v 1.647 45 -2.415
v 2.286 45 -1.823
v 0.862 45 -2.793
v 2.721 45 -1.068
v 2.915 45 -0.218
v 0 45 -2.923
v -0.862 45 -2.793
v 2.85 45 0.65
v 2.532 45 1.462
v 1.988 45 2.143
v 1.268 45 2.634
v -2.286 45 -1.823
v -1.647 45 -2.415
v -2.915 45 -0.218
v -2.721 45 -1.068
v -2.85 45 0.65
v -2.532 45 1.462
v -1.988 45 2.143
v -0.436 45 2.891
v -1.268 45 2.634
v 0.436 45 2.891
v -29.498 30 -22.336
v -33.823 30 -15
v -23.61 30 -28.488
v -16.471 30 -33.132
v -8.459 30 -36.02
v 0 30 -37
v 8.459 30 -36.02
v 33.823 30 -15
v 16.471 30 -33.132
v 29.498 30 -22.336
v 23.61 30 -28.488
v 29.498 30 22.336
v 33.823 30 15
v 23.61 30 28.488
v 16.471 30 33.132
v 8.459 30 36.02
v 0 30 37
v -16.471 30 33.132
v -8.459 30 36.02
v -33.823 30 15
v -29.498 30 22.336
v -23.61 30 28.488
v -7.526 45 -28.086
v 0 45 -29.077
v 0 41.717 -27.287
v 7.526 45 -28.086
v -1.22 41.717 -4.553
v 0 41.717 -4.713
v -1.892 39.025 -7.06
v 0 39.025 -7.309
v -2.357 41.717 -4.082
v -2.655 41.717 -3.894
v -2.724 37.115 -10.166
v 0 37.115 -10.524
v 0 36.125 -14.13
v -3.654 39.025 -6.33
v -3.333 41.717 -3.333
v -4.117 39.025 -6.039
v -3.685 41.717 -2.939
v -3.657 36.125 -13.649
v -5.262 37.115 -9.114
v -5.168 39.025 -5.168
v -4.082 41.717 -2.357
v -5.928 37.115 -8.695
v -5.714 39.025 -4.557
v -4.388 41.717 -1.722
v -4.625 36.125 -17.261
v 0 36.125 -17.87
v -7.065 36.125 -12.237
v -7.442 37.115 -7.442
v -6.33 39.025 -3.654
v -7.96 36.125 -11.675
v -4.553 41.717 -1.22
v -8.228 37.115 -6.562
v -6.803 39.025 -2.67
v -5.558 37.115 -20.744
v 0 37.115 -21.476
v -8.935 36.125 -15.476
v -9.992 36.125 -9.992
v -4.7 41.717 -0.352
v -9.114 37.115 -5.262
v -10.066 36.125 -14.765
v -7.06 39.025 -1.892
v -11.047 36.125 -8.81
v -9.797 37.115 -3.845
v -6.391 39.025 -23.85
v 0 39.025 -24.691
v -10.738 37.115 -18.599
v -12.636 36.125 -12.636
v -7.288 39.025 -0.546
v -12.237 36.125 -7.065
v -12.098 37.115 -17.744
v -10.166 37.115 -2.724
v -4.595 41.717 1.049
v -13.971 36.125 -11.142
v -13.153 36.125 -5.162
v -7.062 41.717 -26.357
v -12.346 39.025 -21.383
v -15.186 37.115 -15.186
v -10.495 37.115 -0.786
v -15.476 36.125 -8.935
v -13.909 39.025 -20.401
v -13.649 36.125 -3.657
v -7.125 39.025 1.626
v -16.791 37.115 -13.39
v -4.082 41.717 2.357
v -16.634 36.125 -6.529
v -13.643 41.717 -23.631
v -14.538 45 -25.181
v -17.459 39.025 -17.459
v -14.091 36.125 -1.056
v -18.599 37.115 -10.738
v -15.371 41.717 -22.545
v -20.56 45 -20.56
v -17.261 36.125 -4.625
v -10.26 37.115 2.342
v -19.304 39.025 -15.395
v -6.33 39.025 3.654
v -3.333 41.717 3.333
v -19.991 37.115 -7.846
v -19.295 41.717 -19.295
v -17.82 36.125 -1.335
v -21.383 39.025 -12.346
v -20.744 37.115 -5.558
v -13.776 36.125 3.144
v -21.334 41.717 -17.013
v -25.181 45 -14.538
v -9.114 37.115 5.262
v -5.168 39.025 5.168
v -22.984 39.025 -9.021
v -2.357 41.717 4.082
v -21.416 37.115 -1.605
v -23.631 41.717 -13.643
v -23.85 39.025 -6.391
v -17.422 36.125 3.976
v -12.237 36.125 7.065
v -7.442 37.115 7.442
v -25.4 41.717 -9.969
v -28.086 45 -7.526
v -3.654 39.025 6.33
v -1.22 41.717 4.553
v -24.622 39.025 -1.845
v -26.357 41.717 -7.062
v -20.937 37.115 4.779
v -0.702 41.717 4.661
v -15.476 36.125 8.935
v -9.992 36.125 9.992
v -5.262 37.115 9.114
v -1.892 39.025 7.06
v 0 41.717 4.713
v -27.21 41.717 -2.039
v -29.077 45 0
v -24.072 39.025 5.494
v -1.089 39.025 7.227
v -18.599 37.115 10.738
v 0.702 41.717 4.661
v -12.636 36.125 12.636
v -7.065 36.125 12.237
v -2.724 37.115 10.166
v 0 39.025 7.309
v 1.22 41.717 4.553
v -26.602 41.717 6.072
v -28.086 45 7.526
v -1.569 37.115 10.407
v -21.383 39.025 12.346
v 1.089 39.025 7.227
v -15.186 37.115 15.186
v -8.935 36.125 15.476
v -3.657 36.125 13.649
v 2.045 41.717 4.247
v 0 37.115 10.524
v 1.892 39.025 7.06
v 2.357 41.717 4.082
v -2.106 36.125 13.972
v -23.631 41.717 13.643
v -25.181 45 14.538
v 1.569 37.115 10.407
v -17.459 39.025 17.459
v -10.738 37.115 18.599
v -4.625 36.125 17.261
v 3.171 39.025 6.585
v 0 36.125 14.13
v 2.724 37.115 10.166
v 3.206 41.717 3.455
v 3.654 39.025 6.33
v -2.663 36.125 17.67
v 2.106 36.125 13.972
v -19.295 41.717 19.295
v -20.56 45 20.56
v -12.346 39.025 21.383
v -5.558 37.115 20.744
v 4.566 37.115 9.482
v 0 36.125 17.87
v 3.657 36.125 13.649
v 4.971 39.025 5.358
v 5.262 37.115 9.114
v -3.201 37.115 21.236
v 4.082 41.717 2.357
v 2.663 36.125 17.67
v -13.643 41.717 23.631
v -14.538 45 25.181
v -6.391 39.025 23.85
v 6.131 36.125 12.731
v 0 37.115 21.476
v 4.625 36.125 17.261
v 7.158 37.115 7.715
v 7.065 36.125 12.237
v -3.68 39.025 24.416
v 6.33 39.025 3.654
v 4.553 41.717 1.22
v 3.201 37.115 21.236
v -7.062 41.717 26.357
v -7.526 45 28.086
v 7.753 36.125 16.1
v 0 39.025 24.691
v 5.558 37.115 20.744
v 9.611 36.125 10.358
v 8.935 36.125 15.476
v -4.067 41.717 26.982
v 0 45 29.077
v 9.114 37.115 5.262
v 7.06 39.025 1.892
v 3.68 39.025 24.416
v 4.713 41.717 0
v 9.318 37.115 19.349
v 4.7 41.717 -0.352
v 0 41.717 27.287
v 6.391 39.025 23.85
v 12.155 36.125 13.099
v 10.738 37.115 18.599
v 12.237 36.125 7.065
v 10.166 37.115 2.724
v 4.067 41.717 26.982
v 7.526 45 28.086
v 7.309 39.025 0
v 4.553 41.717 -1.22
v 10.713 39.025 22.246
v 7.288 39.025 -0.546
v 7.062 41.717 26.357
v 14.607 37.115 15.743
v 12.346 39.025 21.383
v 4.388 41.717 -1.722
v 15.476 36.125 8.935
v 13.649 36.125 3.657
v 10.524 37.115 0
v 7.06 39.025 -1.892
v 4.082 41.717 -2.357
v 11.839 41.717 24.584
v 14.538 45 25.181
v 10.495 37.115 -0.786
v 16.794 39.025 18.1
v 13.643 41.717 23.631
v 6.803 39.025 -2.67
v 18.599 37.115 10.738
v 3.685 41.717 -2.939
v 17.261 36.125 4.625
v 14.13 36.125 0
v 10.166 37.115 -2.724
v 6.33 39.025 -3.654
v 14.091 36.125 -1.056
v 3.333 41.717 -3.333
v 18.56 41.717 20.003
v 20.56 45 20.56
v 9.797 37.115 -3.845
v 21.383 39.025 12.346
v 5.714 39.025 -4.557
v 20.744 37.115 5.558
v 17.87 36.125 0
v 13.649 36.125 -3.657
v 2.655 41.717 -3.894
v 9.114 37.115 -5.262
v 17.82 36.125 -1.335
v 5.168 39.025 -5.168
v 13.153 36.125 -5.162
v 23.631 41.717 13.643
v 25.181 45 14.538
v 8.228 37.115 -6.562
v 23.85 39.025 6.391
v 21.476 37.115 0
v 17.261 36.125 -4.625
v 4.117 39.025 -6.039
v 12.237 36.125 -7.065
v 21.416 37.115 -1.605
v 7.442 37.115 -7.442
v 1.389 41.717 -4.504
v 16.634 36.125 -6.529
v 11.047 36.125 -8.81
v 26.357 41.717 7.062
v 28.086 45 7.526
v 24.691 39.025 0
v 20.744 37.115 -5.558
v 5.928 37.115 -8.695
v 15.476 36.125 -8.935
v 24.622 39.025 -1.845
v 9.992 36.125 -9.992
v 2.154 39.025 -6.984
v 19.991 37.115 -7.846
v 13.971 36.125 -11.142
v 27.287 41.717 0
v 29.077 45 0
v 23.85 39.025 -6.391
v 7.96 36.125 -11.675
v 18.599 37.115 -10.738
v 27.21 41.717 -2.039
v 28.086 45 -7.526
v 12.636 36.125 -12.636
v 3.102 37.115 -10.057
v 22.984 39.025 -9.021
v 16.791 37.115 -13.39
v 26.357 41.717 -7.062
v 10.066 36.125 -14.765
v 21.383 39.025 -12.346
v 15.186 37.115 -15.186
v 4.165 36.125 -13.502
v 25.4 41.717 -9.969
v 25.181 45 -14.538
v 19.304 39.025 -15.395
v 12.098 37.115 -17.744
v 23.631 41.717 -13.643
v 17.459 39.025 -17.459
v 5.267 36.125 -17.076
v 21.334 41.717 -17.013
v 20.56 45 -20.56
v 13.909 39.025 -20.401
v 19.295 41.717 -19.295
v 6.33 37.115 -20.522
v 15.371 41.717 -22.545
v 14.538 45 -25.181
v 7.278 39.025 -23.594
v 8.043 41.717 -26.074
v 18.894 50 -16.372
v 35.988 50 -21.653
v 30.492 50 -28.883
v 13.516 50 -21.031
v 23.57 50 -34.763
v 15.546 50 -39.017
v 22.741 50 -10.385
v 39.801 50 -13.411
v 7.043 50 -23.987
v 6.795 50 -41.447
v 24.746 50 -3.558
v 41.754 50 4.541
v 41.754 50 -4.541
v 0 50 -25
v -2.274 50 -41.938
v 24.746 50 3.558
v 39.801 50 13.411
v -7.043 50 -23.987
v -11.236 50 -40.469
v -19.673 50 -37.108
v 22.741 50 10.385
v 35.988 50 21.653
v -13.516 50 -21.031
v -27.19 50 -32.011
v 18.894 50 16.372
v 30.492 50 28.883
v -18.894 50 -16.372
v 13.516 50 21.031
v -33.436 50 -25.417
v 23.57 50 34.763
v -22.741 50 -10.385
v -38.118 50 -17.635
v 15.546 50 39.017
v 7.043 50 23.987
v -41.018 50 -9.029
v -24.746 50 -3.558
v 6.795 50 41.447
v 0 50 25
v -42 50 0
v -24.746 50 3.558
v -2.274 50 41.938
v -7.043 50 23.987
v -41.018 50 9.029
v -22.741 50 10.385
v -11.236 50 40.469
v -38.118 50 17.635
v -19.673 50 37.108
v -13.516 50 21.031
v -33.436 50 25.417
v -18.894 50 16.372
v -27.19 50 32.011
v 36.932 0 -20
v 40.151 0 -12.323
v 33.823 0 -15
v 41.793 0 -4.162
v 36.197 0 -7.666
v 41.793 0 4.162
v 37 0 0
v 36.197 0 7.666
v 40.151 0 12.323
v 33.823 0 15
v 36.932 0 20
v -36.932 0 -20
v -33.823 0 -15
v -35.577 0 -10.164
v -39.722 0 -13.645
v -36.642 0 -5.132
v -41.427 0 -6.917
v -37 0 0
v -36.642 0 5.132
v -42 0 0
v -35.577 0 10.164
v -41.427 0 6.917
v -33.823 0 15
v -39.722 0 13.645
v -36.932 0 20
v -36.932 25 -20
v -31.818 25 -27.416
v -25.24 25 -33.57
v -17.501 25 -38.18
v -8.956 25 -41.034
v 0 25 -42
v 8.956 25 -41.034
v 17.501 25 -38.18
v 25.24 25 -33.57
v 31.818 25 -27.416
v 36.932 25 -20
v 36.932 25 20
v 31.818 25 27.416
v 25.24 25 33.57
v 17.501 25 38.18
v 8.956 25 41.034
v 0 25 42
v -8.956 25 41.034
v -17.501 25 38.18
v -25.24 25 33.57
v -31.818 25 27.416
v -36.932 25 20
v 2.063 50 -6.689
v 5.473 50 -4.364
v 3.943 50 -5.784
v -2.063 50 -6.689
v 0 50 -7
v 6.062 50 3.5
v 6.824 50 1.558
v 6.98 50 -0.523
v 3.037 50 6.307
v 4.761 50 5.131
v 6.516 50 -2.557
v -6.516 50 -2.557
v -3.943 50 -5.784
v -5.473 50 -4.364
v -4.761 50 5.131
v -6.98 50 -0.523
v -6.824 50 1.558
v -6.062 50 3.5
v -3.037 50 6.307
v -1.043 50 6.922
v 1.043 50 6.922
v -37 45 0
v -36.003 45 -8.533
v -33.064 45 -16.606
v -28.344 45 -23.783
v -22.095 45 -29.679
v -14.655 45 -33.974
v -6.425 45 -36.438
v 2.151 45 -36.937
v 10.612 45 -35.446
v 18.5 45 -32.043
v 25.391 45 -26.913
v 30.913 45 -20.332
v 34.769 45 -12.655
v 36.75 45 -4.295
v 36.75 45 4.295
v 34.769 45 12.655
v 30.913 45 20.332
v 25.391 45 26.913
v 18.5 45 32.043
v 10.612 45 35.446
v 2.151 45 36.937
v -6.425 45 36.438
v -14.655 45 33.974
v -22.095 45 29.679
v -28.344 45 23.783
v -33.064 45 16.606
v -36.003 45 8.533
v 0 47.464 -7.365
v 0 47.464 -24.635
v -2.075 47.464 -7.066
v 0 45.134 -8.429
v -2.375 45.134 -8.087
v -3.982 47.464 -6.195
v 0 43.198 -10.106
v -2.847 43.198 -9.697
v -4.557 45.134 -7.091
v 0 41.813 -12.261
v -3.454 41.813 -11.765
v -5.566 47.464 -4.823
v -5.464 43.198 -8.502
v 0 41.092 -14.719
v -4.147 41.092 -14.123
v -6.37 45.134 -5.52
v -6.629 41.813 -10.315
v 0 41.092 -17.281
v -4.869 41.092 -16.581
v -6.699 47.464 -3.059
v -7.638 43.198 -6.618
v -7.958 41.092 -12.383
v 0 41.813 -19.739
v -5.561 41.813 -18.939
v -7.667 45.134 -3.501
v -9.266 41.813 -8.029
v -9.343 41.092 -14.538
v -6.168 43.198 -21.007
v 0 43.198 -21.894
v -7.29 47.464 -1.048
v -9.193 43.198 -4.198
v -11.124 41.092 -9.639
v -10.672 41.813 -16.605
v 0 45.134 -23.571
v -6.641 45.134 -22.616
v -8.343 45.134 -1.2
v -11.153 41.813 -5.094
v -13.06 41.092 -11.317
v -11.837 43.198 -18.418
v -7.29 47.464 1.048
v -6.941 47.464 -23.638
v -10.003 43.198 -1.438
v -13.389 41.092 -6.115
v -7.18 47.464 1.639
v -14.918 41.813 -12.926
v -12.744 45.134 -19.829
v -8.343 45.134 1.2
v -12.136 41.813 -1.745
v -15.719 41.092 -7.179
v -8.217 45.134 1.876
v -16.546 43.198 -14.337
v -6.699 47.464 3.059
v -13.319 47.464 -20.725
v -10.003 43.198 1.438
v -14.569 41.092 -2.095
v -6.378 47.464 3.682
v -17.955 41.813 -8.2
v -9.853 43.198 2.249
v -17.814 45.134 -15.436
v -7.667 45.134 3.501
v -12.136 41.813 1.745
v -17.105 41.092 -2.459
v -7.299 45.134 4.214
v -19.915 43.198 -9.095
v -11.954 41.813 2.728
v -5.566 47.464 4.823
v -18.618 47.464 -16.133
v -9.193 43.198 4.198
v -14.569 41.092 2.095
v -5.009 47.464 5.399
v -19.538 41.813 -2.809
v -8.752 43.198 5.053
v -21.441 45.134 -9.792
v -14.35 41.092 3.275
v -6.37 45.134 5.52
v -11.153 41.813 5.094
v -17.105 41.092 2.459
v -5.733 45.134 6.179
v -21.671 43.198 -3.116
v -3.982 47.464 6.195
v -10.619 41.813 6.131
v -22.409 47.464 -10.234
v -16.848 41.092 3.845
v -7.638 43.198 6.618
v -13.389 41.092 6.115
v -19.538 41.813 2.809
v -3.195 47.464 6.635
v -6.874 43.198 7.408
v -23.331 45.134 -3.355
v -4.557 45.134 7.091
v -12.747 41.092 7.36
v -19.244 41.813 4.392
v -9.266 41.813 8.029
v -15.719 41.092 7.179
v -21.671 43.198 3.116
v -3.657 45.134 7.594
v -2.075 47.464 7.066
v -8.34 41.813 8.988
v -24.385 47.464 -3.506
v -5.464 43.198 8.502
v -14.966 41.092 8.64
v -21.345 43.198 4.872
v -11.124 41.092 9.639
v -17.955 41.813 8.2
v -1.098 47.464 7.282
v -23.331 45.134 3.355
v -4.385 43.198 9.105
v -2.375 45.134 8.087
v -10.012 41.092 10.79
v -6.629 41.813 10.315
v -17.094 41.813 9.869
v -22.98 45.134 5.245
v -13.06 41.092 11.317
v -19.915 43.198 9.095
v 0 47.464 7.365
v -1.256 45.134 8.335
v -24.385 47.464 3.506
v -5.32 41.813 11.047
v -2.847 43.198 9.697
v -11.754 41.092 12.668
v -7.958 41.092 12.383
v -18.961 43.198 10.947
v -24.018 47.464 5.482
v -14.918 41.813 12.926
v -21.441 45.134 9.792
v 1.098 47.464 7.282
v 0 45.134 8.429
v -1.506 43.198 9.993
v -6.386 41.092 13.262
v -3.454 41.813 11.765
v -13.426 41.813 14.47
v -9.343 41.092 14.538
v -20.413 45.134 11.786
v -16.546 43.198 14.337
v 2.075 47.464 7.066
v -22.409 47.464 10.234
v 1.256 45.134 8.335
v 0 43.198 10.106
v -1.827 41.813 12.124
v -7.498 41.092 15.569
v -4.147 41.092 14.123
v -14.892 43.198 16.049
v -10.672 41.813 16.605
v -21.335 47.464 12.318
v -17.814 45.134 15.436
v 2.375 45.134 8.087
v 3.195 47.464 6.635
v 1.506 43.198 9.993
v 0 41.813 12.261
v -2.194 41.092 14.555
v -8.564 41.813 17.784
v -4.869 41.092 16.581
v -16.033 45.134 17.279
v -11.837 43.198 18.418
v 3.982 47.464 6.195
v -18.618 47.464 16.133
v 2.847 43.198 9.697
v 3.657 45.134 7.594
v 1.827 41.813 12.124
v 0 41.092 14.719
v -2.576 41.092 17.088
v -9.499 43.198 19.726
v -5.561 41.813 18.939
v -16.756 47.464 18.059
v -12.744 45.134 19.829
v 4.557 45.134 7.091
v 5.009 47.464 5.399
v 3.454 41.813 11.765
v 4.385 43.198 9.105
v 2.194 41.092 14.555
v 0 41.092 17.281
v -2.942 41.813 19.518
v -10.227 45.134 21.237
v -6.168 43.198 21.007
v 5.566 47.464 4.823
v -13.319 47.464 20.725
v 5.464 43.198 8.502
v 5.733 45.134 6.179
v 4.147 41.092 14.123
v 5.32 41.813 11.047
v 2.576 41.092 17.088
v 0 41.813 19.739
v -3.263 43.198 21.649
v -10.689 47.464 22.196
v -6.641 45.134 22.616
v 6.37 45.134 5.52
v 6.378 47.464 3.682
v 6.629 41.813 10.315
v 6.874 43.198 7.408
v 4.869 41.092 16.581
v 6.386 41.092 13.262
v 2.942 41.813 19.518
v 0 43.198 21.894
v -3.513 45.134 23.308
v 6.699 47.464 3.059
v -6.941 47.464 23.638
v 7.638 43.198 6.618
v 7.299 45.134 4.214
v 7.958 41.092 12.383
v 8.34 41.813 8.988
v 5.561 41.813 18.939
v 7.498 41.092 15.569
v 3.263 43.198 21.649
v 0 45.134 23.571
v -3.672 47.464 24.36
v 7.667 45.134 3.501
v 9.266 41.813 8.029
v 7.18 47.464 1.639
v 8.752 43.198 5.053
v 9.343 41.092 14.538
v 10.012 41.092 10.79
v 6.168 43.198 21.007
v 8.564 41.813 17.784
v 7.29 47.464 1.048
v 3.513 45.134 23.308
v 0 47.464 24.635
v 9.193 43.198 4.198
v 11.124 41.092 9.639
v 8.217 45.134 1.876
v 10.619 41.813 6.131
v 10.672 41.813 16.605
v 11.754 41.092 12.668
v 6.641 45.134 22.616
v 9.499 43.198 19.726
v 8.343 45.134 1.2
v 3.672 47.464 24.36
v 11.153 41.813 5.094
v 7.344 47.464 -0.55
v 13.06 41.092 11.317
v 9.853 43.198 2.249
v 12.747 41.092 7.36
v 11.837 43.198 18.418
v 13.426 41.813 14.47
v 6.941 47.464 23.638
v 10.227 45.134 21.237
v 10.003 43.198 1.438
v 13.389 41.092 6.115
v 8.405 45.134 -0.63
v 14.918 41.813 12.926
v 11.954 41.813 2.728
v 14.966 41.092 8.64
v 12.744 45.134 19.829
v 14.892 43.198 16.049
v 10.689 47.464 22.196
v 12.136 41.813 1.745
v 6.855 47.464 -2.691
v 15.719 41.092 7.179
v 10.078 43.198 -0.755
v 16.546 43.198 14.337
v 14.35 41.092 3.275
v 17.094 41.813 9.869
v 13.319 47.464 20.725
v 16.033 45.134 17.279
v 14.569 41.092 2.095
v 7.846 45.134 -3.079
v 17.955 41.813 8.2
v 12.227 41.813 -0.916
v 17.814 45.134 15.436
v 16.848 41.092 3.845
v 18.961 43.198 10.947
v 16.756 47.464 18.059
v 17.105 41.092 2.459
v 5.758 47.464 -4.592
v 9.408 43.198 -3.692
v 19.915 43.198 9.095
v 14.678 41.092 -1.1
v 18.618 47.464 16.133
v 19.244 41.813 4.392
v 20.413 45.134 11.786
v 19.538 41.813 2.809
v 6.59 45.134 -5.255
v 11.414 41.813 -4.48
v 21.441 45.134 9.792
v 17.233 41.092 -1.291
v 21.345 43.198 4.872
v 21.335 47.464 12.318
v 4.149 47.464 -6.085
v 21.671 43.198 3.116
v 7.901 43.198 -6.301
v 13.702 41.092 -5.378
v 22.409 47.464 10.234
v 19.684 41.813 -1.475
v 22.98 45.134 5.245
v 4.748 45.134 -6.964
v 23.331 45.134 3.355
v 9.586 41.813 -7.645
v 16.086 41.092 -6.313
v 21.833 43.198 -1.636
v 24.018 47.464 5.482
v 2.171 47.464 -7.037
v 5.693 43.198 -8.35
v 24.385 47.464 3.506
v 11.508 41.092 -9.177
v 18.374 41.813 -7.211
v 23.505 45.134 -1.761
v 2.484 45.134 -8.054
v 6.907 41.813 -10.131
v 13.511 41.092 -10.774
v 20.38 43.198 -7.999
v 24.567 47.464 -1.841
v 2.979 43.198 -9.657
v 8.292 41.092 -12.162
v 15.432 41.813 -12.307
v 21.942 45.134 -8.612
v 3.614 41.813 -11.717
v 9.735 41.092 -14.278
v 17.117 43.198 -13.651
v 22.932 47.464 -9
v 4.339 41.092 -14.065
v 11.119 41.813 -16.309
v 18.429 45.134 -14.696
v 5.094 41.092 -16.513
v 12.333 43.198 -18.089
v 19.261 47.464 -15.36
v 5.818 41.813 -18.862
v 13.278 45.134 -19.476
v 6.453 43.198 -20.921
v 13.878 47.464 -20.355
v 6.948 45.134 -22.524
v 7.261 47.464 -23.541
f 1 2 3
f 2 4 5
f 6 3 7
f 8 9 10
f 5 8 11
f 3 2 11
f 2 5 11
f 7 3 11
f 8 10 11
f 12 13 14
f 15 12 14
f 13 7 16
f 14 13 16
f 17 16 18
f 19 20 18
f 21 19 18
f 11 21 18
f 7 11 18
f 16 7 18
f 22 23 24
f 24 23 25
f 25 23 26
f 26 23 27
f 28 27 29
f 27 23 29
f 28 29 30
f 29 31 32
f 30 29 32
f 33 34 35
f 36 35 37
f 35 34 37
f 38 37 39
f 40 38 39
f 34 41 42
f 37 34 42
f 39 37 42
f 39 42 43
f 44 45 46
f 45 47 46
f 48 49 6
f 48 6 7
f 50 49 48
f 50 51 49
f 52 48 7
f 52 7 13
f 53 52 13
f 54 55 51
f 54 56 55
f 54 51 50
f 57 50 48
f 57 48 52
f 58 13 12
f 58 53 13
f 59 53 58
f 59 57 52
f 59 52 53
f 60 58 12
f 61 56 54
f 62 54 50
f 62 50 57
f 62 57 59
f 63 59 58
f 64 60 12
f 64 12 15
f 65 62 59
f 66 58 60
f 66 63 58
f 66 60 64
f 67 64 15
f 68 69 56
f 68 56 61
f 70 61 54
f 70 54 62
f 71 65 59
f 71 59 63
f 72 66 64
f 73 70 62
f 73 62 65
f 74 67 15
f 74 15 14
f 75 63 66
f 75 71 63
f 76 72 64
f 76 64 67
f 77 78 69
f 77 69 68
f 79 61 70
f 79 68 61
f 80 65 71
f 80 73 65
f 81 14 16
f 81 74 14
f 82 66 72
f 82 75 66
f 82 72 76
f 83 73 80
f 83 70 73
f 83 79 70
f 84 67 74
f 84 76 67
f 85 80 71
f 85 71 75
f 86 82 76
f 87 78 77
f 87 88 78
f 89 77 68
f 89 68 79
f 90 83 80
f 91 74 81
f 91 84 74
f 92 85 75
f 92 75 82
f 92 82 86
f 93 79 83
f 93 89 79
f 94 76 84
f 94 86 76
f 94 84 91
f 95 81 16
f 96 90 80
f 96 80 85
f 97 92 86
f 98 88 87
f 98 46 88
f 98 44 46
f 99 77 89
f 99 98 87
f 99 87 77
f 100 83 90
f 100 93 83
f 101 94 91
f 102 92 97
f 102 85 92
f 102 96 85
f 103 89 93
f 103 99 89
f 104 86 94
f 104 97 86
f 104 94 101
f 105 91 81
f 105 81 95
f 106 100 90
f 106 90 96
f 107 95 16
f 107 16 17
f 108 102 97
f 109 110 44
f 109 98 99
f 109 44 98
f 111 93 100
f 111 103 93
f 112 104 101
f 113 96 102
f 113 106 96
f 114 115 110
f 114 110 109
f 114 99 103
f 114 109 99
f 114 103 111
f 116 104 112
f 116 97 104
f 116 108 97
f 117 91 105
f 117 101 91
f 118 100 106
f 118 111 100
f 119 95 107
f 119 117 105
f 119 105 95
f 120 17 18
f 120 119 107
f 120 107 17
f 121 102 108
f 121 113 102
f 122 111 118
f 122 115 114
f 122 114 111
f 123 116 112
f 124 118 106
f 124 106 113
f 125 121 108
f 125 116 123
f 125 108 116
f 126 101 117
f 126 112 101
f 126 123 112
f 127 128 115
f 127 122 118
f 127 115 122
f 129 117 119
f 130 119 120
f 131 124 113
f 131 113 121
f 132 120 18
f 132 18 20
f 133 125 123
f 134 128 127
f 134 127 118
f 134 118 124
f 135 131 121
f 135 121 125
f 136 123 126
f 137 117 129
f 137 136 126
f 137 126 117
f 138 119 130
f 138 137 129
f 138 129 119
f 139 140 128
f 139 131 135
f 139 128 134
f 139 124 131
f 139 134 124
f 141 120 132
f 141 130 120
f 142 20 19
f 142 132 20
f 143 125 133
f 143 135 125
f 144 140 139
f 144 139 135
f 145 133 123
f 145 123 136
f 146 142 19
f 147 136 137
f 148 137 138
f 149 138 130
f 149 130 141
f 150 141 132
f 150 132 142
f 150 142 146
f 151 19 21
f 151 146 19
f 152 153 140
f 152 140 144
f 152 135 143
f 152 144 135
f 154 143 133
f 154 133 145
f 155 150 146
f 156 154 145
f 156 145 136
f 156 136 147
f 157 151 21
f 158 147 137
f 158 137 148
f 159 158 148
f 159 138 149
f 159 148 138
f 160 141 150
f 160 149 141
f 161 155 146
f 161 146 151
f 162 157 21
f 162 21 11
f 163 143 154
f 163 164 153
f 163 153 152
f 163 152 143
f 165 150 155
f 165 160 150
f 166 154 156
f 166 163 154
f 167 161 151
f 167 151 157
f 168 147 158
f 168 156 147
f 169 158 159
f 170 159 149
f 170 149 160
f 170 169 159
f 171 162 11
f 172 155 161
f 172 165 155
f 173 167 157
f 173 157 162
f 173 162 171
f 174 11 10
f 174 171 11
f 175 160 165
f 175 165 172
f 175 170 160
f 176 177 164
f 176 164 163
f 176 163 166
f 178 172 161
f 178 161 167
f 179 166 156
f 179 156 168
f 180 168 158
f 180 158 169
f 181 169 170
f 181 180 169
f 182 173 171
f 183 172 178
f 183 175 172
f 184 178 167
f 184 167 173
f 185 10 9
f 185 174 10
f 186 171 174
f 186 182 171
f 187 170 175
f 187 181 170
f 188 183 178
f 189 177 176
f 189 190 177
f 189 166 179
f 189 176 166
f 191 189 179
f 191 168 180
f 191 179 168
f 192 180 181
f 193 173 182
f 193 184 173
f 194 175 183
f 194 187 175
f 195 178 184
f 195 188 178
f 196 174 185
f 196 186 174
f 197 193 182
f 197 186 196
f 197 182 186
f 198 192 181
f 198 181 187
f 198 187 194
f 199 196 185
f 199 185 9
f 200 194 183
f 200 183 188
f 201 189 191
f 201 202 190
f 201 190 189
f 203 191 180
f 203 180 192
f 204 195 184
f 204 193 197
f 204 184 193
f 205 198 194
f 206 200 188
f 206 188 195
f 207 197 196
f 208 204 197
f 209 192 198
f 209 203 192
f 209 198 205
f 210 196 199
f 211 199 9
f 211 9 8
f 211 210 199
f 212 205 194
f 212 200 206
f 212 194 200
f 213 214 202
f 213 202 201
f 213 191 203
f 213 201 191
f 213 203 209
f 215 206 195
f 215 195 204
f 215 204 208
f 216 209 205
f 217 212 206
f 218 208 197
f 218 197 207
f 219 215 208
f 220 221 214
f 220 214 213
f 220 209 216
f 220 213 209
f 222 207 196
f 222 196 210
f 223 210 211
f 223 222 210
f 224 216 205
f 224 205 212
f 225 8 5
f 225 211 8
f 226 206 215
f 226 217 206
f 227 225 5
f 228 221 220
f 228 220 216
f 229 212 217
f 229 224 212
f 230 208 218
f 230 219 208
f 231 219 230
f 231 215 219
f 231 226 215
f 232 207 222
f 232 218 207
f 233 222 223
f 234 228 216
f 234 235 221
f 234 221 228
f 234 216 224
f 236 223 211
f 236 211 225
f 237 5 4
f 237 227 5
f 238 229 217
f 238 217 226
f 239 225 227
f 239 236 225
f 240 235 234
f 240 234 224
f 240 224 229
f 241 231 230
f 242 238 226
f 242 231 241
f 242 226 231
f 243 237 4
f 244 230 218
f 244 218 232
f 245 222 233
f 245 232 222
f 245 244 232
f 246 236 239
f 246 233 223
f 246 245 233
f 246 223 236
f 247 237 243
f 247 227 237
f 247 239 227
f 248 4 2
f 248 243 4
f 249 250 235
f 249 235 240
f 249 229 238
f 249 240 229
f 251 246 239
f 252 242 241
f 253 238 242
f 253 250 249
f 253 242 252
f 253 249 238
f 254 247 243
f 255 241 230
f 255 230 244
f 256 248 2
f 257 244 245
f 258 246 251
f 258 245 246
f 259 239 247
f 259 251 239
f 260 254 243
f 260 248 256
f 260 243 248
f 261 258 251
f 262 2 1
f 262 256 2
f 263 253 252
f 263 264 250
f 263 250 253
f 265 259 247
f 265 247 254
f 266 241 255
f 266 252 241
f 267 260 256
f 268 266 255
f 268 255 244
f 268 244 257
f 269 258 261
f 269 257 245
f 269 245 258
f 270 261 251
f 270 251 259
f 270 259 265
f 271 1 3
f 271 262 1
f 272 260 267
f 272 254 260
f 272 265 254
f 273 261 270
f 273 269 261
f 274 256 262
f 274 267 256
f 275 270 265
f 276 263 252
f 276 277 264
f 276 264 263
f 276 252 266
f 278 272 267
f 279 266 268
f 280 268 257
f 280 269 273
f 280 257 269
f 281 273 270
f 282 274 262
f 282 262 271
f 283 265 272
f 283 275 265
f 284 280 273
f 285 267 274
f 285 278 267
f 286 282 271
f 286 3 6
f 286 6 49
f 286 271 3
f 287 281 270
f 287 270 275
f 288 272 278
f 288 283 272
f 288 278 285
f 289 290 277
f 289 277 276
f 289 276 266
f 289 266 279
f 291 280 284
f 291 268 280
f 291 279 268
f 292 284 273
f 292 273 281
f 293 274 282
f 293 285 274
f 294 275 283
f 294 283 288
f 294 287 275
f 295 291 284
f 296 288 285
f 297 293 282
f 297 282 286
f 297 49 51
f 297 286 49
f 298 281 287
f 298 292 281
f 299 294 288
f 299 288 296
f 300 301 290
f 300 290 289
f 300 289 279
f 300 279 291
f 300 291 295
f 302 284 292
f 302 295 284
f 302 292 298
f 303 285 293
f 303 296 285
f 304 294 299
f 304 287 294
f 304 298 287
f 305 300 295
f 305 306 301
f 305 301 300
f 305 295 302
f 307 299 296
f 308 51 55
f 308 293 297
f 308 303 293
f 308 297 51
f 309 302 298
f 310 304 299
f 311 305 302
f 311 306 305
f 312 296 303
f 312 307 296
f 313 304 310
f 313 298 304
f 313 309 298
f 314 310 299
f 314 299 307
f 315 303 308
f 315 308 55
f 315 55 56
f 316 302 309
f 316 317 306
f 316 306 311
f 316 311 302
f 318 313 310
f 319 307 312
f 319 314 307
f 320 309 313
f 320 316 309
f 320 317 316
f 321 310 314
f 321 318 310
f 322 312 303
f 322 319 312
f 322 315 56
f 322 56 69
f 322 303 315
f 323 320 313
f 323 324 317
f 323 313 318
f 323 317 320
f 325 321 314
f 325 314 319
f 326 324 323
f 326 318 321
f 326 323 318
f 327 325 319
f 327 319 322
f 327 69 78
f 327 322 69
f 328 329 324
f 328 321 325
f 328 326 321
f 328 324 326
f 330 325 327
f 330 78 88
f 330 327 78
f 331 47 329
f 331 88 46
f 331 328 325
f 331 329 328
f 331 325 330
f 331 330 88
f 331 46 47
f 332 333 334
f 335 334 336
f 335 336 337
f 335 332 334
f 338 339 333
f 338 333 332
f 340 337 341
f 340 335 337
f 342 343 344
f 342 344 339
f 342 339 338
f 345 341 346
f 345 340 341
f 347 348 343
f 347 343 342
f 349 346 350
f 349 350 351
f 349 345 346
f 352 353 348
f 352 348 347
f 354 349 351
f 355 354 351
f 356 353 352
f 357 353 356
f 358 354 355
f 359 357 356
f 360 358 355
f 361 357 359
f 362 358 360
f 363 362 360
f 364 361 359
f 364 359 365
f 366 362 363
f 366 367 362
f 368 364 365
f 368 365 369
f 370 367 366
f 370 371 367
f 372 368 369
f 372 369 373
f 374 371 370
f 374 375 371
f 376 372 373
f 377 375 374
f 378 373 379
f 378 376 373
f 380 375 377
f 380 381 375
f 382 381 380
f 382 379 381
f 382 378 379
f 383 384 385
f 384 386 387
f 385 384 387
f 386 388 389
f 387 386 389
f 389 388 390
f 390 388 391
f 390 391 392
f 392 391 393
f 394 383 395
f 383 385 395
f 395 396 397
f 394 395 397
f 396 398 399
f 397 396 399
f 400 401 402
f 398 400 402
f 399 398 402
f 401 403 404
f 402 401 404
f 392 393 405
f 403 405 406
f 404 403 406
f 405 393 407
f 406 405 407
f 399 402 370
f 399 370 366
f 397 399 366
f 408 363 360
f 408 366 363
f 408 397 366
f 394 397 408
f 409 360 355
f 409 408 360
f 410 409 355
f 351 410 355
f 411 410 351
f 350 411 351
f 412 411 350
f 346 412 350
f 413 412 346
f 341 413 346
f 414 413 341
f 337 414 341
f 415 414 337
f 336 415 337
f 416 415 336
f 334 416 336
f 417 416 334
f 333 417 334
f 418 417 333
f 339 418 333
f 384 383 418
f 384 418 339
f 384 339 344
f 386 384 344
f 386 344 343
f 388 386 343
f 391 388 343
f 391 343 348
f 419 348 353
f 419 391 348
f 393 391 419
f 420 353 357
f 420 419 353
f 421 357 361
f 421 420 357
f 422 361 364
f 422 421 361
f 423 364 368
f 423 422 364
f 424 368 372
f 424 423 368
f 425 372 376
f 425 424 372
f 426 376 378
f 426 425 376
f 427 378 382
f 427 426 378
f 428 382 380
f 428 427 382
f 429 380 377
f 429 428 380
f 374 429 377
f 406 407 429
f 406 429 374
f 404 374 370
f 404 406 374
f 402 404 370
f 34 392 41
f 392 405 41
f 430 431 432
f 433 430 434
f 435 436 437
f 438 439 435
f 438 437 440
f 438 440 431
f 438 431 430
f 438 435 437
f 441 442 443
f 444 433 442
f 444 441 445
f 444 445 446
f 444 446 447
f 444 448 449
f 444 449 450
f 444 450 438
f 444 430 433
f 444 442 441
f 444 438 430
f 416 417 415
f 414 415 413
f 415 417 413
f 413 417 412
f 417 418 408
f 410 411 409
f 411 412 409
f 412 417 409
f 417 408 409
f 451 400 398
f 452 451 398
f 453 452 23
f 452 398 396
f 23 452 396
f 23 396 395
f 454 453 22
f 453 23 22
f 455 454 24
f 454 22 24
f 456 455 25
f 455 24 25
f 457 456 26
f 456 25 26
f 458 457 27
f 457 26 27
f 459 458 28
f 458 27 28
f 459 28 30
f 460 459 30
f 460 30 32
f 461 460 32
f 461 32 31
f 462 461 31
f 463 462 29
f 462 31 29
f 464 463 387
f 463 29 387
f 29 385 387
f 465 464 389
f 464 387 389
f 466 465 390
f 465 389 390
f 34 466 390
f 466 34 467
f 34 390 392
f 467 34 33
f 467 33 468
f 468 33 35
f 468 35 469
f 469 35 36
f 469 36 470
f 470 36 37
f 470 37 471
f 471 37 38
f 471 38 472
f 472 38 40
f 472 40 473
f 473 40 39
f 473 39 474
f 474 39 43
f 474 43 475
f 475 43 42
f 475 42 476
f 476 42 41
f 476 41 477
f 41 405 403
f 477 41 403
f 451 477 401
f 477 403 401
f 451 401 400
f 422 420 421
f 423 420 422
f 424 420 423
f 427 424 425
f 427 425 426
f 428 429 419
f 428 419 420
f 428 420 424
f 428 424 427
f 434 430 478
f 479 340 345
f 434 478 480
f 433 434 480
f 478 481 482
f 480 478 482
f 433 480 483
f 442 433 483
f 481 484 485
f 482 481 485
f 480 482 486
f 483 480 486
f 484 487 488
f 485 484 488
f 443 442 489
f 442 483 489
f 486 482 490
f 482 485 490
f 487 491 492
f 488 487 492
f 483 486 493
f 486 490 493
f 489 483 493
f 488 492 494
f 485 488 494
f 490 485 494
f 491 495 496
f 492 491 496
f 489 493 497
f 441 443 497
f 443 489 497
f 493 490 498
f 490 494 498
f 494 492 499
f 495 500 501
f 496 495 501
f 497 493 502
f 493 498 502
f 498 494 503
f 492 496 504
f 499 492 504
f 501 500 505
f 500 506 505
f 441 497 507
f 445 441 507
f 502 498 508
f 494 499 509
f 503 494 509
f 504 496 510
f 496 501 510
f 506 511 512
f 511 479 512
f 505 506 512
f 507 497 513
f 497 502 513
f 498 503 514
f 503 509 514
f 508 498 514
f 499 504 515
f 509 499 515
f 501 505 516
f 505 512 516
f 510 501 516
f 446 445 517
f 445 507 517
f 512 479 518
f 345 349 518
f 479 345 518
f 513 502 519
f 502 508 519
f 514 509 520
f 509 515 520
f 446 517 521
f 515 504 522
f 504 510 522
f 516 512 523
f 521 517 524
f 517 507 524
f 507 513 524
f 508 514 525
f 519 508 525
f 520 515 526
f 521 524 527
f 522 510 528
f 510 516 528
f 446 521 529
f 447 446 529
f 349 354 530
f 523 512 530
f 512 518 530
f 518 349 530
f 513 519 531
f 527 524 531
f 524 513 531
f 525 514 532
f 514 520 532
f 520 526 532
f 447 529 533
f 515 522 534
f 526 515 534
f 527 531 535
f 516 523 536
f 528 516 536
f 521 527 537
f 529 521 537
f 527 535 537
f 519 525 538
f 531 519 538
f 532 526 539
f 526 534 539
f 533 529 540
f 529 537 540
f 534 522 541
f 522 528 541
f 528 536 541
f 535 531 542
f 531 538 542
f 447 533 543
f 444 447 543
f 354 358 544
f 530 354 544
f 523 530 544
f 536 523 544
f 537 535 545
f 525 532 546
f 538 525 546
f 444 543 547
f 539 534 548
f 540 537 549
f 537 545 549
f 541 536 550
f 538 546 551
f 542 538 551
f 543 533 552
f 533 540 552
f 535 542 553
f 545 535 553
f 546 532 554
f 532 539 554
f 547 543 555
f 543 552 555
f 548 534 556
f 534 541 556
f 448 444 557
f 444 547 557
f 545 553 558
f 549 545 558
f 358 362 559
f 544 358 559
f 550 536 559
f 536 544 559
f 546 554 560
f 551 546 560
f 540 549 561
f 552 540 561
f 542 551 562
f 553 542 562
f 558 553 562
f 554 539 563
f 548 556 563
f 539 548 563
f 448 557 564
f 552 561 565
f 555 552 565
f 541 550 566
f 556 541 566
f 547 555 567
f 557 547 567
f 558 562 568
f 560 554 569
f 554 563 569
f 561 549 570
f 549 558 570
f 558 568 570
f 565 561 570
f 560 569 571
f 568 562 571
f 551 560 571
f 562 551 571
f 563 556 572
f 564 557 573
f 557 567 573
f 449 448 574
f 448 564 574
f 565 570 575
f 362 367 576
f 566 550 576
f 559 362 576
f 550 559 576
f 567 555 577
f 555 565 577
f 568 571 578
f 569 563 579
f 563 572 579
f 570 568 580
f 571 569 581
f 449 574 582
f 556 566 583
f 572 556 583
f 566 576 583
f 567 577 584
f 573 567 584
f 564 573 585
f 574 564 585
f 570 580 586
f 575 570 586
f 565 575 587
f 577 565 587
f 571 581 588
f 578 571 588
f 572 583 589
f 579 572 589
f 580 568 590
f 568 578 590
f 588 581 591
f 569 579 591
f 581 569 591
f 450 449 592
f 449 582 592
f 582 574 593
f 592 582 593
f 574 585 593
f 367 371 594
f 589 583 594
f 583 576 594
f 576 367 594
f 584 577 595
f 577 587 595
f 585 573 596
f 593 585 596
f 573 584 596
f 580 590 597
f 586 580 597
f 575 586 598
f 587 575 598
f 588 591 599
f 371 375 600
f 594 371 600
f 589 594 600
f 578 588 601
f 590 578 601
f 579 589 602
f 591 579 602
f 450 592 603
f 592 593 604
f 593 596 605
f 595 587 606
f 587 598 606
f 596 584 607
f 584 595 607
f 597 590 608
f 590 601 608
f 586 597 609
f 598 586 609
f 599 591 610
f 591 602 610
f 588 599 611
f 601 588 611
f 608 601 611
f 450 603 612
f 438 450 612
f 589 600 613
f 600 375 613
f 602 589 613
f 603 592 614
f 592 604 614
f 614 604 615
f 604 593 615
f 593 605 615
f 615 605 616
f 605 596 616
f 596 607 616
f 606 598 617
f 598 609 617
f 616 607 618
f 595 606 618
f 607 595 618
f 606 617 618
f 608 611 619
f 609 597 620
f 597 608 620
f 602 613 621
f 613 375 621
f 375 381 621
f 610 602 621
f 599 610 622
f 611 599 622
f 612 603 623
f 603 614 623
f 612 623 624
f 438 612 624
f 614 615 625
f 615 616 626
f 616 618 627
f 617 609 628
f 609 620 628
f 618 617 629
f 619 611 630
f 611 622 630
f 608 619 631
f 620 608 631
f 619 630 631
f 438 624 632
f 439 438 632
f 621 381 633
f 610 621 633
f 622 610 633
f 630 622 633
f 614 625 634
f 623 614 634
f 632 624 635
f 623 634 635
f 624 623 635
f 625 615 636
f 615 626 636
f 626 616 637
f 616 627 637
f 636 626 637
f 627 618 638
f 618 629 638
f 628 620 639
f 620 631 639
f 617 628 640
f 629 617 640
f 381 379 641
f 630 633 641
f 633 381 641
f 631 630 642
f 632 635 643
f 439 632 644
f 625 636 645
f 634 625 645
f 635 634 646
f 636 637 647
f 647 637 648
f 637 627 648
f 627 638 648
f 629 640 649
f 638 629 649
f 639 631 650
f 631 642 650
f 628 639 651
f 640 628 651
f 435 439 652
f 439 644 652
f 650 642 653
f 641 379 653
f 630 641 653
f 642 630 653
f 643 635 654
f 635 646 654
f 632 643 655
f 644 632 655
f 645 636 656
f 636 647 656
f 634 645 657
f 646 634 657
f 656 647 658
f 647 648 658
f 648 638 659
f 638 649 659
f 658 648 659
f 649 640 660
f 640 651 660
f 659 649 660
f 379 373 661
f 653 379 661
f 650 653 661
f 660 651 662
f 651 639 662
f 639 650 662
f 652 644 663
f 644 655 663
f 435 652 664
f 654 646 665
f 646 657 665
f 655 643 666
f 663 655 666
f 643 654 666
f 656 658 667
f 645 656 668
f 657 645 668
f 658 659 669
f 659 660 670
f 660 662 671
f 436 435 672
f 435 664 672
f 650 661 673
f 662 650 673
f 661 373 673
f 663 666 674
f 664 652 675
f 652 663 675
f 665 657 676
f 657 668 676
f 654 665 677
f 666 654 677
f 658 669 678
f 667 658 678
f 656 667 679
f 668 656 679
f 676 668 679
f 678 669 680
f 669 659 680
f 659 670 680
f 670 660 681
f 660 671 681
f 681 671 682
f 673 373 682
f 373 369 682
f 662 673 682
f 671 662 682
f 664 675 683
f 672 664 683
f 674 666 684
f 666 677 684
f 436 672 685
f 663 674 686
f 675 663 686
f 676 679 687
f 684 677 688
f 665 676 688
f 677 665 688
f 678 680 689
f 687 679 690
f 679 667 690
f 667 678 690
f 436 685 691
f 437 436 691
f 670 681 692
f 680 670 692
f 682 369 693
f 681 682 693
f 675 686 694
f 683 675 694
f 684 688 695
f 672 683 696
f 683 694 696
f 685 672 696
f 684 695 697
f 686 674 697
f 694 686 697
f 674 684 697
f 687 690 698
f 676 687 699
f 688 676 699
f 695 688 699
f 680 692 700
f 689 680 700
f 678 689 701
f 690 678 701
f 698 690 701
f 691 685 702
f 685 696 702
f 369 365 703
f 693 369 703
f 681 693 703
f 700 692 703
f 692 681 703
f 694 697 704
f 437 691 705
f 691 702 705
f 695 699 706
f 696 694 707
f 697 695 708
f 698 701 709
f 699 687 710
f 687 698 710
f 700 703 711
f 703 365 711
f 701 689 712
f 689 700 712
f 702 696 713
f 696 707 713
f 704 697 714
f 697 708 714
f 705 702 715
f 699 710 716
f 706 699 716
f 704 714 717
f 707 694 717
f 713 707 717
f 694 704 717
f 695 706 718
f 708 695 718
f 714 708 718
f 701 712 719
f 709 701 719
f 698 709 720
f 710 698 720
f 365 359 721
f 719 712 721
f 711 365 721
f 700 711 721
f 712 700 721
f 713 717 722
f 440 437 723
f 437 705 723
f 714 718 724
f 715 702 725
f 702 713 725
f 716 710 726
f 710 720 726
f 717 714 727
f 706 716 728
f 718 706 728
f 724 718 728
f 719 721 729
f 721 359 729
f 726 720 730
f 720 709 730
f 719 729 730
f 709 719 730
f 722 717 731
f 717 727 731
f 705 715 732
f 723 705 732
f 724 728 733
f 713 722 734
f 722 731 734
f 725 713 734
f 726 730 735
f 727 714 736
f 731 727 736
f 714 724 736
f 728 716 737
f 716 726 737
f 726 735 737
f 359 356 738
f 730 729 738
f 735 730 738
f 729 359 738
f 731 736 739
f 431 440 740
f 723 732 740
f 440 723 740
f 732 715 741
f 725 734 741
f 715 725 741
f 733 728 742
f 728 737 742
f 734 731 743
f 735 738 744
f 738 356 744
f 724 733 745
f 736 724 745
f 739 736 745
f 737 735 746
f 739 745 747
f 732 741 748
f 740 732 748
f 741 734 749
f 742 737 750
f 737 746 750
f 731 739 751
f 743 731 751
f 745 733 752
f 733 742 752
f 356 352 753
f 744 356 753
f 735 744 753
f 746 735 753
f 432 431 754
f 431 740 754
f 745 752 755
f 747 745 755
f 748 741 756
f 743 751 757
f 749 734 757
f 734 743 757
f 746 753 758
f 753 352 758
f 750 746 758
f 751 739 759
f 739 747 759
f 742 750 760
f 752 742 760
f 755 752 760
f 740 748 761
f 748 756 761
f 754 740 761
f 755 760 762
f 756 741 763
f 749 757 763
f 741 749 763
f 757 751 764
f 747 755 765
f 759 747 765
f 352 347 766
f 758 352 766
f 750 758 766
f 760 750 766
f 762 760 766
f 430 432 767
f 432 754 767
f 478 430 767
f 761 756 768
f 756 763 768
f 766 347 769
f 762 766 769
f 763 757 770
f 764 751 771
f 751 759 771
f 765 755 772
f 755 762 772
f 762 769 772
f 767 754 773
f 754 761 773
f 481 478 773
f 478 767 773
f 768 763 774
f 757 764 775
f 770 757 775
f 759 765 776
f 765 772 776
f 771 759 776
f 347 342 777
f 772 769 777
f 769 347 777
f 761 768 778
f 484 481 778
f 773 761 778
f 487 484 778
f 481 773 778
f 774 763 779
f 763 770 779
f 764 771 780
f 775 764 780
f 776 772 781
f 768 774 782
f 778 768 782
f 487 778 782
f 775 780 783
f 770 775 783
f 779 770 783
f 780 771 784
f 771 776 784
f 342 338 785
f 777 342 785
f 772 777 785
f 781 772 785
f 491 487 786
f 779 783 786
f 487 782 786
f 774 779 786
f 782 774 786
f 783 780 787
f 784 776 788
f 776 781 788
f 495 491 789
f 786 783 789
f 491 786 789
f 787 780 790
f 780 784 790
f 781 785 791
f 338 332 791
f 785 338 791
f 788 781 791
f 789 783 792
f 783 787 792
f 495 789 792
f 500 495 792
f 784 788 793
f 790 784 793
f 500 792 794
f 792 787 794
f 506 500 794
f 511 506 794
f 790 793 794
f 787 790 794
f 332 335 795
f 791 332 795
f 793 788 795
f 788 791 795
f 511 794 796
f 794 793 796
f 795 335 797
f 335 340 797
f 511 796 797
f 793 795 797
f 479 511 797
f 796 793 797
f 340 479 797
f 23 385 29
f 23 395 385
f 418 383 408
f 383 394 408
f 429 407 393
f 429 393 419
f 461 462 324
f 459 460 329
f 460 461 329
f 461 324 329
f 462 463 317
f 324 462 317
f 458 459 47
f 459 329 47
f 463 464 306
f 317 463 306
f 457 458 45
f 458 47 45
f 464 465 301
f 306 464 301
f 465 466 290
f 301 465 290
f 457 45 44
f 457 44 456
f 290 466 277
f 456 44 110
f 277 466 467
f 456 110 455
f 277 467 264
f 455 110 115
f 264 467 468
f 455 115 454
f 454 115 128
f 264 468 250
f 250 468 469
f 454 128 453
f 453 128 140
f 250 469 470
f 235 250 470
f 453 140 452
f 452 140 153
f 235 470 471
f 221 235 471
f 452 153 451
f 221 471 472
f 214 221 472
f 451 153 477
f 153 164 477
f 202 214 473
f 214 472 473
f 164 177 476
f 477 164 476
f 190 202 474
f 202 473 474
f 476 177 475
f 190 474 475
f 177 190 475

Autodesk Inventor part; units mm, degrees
ref_plane "YZ Plane" through (0, 0, 0) normal (1, 0, 0) x (0, 1, 0)
ref_plane "XZ Plane" through (0, 0, 0) normal (0, 1, 0) x (-1, 0, 0)
ref_plane "XY Plane" through (0, 0, 0) normal (0, 0, 1) x (1, 0, 0)
sketch "Sketch1" plane through (0, 0, 0) normal (0, 1, 0) x (-1, 0, 0)
  circle A0 centre (0, 0) radius 42
  dimension "d0" = 84
extrude "Extrusion1" add sketch "Sketch1" along normal blind 50
sketch "Sketch3" plane through (0, 0, 0) normal (1, 0, 0) x (0, 1, 0)
  line L0 (50, -42) -> (50, 42) projected
  circle A0 centre (50, -16) radius 9
  line L1 (-11.8, 0) -> (70.8, 0) projected
  line L2 (71.2036, 0) -> (0, 0)
  point P0 (50, -7)
  point P1 (50, -25)
  dimension "d4" = 18
  dimension "d5" = 32
revolve "Revolution1" cut sketch "Sketch3" angle 360 about axis through (0, -10, 0) along (0, 1, 0) picked at (45.6277, -15.2948) contours A0 L0
sketch "Sketch4" plane through (0, 0, 0) normal (1, 0, 0) x (0, 1, 0)
  line L0 (0, -42) -> (0, 42) projected
  line L1 (0, -20) -> (25, -20)
  line L2 (25, -20) -> (25, -95.9961)
  line L3 (25, -95.9961) -> (0, -95.9961)
  line L4 (0, -95.9961) -> (0, -20)
  line L5 (-10, 0) -> (60, 0) projected
  line L6 (0, 20) -> (25, 20)
  line L7 (25, 20) -> (25, 95.9961)
  line L8 (25, 95.9961) -> (0, 95.9961)
  line L9 (0, 95.9961) -> (0, 20)
  point P0 (0, 0)
  dimension "d7" = 25
  dimension "d8" = 20
extrude "Extrusion2" cut sketch "Sketch4" along normal mid plane 100
shell "Shell1" thickness 5 removed faces 1 at (11.381, 0, 4.5482)
properties material "Aluminum 6061"
